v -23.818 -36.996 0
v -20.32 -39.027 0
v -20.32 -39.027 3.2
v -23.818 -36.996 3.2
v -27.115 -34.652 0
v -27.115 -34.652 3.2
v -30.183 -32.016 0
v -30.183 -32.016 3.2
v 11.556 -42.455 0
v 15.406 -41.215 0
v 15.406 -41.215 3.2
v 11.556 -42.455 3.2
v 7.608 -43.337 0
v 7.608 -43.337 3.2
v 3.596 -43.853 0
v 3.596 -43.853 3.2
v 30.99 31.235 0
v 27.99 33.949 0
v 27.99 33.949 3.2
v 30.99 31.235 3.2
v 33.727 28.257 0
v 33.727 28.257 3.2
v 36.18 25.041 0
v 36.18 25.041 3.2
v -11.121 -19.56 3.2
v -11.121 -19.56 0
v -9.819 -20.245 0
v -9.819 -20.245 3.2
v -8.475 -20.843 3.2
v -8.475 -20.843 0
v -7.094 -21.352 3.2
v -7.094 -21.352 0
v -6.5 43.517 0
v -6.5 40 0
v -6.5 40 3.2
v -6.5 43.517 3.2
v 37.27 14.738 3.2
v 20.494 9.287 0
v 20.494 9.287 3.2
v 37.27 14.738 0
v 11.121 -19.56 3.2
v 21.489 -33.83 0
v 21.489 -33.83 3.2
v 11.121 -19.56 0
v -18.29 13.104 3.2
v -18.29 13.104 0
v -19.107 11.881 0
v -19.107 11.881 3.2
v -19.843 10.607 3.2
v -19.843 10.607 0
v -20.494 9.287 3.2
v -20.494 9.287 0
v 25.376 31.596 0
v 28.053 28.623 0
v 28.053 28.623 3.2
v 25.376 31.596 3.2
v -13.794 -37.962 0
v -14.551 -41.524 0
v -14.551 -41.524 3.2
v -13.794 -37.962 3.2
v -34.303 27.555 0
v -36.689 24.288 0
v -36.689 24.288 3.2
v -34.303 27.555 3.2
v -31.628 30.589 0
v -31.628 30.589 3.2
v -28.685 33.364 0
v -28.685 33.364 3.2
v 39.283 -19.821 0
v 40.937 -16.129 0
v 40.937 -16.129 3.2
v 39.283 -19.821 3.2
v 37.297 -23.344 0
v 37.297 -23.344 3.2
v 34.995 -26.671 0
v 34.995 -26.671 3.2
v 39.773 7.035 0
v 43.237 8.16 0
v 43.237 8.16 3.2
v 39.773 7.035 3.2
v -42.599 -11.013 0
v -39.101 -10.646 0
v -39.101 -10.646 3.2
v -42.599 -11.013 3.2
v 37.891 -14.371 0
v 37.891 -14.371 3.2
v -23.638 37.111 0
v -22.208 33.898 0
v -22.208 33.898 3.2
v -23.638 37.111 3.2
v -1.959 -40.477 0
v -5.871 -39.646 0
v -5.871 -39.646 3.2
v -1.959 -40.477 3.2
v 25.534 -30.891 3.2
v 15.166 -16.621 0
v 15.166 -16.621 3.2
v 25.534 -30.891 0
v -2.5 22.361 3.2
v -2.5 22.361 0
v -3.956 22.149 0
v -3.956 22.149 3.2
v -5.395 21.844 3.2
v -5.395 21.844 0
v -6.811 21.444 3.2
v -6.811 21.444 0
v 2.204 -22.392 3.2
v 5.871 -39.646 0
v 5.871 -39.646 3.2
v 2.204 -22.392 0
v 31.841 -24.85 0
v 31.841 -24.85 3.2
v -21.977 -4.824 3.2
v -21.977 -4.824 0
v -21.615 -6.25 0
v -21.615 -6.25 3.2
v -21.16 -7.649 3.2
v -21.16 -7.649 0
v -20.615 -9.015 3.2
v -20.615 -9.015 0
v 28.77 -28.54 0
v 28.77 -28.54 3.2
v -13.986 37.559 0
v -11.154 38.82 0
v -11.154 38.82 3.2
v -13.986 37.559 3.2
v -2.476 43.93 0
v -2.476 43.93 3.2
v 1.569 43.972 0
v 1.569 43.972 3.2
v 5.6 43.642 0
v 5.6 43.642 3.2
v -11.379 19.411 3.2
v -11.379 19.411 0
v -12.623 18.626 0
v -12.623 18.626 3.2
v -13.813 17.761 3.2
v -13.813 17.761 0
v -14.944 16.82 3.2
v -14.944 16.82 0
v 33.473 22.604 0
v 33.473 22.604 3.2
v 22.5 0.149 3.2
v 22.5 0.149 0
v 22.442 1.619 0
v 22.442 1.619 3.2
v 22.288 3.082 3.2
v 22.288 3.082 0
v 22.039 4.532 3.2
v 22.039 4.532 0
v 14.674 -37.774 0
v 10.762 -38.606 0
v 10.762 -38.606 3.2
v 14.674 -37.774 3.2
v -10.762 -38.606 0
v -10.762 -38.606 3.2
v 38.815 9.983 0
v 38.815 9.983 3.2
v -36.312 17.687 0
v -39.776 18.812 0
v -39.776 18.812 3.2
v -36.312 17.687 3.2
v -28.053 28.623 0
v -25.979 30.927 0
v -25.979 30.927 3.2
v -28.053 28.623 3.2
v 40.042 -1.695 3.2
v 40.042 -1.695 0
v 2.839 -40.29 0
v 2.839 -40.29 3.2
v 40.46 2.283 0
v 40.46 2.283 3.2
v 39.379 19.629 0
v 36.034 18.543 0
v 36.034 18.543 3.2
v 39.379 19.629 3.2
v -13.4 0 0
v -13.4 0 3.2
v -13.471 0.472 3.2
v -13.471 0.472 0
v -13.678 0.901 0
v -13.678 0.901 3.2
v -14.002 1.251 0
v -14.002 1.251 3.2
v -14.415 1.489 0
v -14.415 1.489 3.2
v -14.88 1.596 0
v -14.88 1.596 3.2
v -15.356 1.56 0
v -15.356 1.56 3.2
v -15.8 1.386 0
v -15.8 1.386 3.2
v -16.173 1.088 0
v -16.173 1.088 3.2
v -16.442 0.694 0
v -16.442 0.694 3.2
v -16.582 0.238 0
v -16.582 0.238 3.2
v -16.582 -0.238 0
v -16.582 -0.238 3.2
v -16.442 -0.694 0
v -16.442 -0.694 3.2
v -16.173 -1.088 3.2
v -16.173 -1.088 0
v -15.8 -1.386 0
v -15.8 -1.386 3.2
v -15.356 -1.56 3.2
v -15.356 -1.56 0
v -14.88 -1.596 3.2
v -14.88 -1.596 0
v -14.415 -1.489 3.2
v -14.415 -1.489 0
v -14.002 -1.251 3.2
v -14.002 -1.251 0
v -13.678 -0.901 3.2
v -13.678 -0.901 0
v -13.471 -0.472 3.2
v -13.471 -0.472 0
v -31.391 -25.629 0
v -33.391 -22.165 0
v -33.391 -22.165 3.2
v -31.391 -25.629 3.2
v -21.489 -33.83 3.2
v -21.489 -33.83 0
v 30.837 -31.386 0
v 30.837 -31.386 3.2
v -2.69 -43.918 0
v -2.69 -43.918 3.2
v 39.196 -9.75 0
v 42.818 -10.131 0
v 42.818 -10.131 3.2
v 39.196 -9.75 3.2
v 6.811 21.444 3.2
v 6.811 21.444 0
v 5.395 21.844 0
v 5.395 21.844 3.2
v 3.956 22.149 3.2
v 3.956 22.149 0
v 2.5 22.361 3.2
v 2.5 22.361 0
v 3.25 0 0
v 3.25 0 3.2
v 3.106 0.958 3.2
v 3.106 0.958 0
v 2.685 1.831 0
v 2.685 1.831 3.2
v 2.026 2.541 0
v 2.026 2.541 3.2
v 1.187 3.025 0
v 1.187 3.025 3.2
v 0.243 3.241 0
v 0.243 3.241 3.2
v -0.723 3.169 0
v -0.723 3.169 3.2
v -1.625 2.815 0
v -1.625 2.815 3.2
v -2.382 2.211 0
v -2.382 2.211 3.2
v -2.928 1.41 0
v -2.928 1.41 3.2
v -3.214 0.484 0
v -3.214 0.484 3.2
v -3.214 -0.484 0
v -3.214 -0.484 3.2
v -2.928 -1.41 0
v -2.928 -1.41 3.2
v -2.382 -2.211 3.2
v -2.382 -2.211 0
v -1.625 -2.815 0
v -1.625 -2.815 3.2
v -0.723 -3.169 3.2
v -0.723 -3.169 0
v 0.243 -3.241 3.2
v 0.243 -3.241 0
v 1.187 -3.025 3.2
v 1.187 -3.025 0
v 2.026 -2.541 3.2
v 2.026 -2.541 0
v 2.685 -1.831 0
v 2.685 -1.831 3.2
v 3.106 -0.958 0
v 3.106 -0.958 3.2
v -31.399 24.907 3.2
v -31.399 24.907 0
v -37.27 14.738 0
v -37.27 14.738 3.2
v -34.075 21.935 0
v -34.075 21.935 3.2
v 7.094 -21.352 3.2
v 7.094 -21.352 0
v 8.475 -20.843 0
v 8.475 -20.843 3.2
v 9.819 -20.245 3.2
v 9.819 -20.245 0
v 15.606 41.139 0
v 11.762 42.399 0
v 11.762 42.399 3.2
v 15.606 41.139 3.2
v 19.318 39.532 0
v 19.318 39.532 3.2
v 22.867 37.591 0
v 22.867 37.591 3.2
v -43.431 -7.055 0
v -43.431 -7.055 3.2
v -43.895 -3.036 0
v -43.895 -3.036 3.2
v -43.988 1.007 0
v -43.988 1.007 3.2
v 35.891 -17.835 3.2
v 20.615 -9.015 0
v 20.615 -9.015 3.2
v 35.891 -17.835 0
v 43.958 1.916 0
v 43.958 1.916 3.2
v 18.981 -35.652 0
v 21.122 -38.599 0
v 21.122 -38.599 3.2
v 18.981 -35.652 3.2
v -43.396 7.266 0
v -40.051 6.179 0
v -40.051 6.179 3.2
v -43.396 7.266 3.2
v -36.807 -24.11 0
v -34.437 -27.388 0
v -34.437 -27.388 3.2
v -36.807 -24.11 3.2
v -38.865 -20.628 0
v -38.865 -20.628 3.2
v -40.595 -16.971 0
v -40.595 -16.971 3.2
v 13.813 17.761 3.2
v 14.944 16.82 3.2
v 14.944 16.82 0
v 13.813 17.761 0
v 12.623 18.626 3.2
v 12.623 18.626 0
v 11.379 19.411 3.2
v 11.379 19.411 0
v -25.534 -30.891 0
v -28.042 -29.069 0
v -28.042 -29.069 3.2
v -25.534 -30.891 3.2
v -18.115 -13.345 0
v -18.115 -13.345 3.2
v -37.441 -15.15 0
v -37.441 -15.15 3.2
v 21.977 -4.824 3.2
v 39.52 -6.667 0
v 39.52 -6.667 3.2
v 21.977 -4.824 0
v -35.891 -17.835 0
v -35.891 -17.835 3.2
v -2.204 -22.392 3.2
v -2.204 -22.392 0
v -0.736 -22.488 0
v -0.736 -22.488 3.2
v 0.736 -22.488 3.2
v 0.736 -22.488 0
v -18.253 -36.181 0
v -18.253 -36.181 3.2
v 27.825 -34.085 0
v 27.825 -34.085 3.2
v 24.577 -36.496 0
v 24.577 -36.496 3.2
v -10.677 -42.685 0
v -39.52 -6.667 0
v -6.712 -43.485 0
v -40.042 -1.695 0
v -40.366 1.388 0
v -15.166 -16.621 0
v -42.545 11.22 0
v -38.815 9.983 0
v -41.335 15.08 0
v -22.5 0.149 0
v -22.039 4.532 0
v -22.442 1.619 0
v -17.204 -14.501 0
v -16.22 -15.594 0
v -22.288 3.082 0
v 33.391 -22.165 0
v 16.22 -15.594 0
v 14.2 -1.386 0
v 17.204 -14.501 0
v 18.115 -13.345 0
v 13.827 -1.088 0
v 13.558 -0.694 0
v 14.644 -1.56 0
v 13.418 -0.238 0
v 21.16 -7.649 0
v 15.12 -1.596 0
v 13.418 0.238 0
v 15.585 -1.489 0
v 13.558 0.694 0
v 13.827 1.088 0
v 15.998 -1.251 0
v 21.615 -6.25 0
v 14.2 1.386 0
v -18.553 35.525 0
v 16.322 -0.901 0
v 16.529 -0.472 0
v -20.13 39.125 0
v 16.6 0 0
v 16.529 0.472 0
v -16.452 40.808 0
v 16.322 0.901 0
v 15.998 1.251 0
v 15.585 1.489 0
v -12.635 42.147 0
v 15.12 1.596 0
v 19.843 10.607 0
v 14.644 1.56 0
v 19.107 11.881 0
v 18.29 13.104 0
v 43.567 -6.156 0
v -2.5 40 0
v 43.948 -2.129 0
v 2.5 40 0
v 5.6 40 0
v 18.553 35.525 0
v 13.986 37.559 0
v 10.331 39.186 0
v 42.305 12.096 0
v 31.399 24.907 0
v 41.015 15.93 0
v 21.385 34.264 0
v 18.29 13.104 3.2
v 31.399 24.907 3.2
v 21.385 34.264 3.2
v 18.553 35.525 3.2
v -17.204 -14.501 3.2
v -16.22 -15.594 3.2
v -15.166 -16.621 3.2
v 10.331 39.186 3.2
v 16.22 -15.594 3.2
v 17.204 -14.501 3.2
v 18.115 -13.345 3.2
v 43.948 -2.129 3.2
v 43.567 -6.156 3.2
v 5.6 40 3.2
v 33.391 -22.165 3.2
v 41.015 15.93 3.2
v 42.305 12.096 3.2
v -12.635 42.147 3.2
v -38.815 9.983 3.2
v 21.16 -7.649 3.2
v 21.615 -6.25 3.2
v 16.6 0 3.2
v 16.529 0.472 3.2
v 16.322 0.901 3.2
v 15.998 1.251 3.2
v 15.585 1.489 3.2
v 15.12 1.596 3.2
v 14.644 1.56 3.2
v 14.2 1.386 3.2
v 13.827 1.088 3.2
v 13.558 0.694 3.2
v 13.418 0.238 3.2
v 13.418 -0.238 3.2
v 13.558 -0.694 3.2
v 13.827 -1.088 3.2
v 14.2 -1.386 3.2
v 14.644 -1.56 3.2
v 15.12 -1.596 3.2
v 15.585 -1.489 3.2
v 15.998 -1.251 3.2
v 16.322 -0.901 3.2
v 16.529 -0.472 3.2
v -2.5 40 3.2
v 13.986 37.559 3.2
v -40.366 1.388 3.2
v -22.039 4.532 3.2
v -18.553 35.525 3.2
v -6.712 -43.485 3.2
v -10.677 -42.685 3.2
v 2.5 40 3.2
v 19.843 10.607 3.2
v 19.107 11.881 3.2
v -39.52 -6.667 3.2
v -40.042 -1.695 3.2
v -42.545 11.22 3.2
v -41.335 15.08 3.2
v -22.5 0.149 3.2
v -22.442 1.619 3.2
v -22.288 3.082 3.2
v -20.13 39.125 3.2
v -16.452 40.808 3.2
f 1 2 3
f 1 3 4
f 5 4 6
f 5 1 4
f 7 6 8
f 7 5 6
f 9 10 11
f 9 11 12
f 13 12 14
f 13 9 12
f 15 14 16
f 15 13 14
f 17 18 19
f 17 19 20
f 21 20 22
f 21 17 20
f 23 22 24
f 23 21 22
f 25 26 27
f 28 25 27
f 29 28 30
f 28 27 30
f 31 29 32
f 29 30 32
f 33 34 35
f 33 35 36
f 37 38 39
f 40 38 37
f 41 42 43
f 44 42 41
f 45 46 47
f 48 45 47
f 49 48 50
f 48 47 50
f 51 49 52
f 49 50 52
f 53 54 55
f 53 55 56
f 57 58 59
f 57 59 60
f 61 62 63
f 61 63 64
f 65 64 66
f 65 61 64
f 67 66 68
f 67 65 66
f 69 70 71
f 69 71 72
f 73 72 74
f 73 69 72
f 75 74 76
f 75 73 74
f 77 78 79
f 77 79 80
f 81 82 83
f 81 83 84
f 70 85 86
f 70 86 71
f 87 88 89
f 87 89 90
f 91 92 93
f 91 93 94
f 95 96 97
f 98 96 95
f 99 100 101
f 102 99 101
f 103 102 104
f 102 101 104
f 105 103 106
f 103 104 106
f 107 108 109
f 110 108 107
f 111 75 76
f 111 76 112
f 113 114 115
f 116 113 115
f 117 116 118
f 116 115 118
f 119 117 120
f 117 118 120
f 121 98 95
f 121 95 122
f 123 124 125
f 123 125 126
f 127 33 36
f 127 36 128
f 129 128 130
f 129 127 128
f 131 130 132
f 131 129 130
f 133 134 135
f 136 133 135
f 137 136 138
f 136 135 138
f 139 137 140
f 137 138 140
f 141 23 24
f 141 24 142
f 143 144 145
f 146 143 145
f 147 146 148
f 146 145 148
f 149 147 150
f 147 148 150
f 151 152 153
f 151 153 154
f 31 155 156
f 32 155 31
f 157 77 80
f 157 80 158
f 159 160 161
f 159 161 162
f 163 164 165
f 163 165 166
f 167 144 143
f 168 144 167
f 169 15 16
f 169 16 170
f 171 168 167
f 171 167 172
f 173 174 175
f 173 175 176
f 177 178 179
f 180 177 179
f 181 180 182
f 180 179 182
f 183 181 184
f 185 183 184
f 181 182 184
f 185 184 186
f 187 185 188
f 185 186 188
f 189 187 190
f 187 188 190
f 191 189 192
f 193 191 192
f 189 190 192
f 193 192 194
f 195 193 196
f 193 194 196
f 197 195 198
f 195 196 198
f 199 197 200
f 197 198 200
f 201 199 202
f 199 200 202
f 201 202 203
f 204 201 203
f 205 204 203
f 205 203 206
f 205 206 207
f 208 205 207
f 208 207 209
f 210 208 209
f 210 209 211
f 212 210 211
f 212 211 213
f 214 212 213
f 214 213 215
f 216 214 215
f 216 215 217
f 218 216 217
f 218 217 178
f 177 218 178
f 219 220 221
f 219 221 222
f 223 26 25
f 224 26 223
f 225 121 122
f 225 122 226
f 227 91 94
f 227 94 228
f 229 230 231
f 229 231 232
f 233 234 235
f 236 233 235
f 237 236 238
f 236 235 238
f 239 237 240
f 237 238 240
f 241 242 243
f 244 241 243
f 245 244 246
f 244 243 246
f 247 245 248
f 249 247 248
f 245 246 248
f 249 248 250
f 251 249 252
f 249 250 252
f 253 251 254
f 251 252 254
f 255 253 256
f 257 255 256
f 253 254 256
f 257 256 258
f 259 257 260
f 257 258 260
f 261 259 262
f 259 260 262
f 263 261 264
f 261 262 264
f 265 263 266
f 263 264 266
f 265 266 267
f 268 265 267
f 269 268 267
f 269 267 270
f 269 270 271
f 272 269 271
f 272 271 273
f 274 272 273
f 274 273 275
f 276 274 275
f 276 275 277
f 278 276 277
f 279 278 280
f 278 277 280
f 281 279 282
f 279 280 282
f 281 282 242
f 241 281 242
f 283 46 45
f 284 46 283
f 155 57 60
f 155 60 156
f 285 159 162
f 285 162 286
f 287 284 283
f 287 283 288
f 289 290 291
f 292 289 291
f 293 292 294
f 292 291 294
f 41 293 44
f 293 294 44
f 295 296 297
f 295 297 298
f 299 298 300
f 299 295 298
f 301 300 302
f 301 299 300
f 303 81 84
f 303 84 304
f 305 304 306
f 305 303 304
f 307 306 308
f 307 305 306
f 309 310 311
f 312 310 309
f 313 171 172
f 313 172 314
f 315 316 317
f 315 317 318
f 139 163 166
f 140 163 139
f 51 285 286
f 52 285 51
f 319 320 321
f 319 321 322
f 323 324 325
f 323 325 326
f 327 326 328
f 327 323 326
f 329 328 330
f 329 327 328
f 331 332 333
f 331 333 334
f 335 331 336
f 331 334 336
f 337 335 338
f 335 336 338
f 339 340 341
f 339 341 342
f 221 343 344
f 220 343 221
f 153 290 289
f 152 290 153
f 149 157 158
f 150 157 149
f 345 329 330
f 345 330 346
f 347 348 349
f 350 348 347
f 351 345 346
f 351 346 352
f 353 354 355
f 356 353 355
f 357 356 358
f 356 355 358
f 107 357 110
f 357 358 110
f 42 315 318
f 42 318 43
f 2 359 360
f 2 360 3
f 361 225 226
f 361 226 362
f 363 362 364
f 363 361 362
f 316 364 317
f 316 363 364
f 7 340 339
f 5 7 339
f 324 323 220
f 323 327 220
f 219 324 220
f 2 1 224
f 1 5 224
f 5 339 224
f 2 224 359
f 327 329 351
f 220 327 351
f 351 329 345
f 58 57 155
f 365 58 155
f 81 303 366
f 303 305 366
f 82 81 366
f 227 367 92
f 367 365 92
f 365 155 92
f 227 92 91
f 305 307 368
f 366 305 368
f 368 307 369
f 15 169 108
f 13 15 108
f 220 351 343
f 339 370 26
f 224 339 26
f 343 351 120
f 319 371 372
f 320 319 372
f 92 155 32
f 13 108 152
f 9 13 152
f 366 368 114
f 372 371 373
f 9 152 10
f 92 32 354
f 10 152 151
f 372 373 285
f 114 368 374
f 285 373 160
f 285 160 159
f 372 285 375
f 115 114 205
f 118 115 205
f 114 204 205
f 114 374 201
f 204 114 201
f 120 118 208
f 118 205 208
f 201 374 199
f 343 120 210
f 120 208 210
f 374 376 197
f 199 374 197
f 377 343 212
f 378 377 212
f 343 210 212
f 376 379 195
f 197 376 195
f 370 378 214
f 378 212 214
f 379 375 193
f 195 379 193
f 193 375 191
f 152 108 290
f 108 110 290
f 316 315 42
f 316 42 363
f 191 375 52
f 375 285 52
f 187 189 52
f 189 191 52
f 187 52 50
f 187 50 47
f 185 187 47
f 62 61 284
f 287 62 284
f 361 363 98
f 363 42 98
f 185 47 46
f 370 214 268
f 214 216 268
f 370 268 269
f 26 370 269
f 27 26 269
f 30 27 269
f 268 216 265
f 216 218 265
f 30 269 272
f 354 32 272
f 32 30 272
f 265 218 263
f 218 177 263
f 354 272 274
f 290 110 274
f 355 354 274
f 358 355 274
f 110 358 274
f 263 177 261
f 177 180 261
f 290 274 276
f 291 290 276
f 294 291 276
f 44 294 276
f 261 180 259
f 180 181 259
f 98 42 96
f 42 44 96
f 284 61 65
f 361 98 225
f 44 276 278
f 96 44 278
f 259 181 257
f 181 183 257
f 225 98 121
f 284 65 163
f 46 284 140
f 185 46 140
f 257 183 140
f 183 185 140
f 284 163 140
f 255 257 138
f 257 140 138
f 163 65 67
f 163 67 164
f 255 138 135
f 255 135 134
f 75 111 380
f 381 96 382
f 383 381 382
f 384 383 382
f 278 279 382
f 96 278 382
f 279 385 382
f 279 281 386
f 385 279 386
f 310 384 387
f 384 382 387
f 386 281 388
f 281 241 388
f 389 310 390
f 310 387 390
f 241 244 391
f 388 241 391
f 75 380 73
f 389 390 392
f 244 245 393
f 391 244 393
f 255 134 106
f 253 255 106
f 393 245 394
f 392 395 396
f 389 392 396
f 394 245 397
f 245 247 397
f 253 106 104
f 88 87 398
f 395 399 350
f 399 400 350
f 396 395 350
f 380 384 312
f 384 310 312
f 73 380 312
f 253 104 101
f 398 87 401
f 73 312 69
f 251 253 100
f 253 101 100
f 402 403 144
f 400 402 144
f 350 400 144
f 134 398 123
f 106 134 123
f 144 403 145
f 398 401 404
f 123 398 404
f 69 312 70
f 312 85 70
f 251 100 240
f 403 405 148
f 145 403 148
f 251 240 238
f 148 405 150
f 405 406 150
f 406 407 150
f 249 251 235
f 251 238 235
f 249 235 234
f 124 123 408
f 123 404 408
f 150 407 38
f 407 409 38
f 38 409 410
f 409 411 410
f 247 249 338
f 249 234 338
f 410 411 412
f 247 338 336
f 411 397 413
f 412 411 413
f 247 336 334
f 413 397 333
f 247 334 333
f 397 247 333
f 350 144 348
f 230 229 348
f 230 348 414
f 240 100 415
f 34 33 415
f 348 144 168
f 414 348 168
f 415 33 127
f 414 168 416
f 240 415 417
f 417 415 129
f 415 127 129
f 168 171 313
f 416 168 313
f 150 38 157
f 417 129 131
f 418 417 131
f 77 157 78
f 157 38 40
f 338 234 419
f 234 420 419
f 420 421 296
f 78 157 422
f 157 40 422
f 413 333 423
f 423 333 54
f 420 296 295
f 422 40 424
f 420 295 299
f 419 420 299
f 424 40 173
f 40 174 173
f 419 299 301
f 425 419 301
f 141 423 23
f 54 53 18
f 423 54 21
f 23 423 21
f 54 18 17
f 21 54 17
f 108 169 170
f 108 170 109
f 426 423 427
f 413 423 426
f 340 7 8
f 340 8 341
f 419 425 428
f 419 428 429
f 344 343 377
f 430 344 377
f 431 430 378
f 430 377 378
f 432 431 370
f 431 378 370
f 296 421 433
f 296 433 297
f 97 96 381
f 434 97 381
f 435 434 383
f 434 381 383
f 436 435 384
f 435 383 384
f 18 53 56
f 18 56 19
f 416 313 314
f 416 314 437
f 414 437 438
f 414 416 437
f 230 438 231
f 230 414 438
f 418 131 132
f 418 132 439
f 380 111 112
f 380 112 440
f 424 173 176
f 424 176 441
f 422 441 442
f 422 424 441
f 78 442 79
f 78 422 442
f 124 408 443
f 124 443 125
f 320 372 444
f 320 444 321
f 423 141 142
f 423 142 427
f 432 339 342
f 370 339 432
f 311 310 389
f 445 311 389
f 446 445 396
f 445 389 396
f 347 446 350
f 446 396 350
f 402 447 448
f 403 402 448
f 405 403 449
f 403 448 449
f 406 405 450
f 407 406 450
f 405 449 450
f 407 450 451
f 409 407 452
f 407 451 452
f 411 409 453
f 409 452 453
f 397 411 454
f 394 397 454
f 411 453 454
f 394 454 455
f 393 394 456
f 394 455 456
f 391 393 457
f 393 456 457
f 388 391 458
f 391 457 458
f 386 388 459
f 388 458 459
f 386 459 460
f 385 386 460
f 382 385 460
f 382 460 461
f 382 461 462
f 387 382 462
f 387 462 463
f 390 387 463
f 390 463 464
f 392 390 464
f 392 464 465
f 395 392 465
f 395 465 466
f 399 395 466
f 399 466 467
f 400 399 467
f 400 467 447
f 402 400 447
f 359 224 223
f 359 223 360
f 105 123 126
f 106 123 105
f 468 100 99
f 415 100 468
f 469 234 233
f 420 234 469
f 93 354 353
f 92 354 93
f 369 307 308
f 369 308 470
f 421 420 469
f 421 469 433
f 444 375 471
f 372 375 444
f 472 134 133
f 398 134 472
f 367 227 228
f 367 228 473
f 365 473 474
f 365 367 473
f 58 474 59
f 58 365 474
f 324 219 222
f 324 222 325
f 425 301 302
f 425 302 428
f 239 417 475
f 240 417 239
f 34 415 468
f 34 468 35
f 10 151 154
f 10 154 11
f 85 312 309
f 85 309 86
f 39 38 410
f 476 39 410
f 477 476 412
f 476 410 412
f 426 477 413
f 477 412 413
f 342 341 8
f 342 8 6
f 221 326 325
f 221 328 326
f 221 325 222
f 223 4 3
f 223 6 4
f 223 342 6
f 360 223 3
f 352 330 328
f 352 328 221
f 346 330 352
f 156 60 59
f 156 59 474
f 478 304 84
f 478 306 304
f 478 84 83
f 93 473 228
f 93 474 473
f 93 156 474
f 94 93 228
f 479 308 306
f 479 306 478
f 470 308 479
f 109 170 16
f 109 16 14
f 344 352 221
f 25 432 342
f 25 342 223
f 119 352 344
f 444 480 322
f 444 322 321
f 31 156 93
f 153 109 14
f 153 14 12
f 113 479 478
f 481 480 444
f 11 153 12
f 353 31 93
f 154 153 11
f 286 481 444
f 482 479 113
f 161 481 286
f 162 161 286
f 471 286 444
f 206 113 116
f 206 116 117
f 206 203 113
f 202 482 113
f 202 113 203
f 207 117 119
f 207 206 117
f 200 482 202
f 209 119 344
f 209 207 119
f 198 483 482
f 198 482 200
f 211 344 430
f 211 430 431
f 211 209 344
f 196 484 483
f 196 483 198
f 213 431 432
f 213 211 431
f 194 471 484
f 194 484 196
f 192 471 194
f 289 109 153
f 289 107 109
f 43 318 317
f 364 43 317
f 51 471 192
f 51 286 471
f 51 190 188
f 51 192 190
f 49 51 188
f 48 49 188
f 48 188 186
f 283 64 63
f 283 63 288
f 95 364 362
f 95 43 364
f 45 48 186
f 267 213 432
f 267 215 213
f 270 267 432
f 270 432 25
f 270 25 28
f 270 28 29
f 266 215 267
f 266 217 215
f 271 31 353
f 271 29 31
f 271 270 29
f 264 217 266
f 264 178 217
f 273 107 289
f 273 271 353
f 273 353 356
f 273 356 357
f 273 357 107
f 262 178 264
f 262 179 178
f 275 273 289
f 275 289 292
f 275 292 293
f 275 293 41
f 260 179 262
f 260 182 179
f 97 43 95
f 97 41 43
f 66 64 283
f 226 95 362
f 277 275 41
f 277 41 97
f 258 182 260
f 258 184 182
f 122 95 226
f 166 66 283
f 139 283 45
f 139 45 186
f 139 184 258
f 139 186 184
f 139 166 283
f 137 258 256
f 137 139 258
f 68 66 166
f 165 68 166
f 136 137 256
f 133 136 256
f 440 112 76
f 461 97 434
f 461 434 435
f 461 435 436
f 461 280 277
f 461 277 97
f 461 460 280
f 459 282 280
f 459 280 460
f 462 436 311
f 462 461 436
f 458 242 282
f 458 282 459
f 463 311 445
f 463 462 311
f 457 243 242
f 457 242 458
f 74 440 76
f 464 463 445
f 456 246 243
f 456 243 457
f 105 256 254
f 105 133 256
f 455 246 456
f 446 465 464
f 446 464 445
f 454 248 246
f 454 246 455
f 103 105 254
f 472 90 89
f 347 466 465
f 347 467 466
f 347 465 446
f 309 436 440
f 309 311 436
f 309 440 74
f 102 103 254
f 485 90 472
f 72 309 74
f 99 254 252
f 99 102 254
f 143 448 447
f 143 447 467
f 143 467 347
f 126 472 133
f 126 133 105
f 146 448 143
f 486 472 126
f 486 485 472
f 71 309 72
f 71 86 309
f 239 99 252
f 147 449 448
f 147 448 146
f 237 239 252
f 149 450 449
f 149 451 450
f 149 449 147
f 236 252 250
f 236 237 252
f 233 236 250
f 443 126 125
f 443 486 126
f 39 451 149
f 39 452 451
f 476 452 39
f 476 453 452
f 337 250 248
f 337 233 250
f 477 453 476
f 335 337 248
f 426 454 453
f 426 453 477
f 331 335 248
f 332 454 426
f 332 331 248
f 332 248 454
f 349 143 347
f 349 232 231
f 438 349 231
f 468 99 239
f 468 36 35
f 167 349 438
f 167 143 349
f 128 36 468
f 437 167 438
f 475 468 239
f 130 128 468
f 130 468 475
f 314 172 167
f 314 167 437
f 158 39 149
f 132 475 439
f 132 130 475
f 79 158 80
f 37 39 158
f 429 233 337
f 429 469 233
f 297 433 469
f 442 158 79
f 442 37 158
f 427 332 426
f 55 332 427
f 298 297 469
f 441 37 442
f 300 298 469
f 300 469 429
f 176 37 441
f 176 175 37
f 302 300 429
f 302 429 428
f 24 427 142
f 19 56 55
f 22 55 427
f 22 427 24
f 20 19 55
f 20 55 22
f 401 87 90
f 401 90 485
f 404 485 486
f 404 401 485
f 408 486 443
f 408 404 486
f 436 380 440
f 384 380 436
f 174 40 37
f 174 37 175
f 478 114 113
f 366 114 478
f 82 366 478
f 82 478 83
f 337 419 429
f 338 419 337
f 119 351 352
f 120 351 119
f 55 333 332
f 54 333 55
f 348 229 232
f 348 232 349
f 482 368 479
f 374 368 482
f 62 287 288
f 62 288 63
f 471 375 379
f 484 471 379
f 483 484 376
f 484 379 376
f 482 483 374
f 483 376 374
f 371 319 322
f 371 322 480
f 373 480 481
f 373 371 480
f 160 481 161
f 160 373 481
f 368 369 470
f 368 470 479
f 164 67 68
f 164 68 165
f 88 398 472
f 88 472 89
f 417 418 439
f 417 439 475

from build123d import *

# Parameters (mm, degrees)
SKETCH_1_R               = 22.5
EXTRUDE_2_DEPTH          = 3.2
PATTERN_CIRCULAR_2_COUNT = 15
SKETCH_3_R               = 3.25
CUT_EXTRUDE_2_DEPTH      = 3.2
SKETCH_5_R               = 1.6
CUT_EXTRUDE_3_DEPTH      = 10


with BuildPart() as part:
    # ｽｹｯﾁ1 → ﾎﾞｽ - 押し出し2 (new body)
    with BuildSketch(Plane.XY):
        Circle(SKETCH_1_R)
        with BuildLine():
            Line((0, 0), (-2.5, 0))
            Line((-2.5, 0), (-2.5, 40))
            Line((-2.5, 40), (-6.5, 40))
            Line((-6.5, 40), (-6.5, 43.517237964))
            ThreePointArc((-6.5, 43.517237964), (-0.454315658, 43.997654452), (5.6, 43.64218143))
            Line((5.6, 43.64218143), (5.6, 40))
            Line((5.6, 40), (2.5, 40))
            Line((2.5, 40), (2.5, 0))
            Line((2.5, 0), (0, 0))
        make_face()
    extrude_2 = extrude(amount=EXTRUDE_2_DEPTH)

    # 円形ﾊﾟﾀｰﾝ2: ﾎﾞｽ - 押し出し2 ×15 about axis
    pattern_circular_2_axis = Axis((0, 0, 0), (0, 0, 1))
    for i in range(1, PATTERN_CIRCULAR_2_COUNT):
        add(extrude_2.rotate(pattern_circular_2_axis, i * 360 / PATTERN_CIRCULAR_2_COUNT))

    # ｽｹｯﾁ3 → ｶｯﾄ - 押し出し2 (cut)
    with BuildSketch(Plane.XY.offset(3.2)):
        Circle(SKETCH_3_R)
    extrude(amount=-CUT_EXTRUDE_2_DEPTH, mode=Mode.SUBTRACT)

    # ｽｹｯﾁ5 → ｶｯﾄ - 押し出し3 (cut)
    with BuildSketch(Plane.XY.offset(3.2)):
        with Locations((-15, 0)):
            Circle(SKETCH_5_R)
        with Locations((15, 0)):
            Circle(SKETCH_5_R)
    extrude(amount=-CUT_EXTRUDE_3_DEPTH, mode=Mode.SUBTRACT)


solid = part.part
